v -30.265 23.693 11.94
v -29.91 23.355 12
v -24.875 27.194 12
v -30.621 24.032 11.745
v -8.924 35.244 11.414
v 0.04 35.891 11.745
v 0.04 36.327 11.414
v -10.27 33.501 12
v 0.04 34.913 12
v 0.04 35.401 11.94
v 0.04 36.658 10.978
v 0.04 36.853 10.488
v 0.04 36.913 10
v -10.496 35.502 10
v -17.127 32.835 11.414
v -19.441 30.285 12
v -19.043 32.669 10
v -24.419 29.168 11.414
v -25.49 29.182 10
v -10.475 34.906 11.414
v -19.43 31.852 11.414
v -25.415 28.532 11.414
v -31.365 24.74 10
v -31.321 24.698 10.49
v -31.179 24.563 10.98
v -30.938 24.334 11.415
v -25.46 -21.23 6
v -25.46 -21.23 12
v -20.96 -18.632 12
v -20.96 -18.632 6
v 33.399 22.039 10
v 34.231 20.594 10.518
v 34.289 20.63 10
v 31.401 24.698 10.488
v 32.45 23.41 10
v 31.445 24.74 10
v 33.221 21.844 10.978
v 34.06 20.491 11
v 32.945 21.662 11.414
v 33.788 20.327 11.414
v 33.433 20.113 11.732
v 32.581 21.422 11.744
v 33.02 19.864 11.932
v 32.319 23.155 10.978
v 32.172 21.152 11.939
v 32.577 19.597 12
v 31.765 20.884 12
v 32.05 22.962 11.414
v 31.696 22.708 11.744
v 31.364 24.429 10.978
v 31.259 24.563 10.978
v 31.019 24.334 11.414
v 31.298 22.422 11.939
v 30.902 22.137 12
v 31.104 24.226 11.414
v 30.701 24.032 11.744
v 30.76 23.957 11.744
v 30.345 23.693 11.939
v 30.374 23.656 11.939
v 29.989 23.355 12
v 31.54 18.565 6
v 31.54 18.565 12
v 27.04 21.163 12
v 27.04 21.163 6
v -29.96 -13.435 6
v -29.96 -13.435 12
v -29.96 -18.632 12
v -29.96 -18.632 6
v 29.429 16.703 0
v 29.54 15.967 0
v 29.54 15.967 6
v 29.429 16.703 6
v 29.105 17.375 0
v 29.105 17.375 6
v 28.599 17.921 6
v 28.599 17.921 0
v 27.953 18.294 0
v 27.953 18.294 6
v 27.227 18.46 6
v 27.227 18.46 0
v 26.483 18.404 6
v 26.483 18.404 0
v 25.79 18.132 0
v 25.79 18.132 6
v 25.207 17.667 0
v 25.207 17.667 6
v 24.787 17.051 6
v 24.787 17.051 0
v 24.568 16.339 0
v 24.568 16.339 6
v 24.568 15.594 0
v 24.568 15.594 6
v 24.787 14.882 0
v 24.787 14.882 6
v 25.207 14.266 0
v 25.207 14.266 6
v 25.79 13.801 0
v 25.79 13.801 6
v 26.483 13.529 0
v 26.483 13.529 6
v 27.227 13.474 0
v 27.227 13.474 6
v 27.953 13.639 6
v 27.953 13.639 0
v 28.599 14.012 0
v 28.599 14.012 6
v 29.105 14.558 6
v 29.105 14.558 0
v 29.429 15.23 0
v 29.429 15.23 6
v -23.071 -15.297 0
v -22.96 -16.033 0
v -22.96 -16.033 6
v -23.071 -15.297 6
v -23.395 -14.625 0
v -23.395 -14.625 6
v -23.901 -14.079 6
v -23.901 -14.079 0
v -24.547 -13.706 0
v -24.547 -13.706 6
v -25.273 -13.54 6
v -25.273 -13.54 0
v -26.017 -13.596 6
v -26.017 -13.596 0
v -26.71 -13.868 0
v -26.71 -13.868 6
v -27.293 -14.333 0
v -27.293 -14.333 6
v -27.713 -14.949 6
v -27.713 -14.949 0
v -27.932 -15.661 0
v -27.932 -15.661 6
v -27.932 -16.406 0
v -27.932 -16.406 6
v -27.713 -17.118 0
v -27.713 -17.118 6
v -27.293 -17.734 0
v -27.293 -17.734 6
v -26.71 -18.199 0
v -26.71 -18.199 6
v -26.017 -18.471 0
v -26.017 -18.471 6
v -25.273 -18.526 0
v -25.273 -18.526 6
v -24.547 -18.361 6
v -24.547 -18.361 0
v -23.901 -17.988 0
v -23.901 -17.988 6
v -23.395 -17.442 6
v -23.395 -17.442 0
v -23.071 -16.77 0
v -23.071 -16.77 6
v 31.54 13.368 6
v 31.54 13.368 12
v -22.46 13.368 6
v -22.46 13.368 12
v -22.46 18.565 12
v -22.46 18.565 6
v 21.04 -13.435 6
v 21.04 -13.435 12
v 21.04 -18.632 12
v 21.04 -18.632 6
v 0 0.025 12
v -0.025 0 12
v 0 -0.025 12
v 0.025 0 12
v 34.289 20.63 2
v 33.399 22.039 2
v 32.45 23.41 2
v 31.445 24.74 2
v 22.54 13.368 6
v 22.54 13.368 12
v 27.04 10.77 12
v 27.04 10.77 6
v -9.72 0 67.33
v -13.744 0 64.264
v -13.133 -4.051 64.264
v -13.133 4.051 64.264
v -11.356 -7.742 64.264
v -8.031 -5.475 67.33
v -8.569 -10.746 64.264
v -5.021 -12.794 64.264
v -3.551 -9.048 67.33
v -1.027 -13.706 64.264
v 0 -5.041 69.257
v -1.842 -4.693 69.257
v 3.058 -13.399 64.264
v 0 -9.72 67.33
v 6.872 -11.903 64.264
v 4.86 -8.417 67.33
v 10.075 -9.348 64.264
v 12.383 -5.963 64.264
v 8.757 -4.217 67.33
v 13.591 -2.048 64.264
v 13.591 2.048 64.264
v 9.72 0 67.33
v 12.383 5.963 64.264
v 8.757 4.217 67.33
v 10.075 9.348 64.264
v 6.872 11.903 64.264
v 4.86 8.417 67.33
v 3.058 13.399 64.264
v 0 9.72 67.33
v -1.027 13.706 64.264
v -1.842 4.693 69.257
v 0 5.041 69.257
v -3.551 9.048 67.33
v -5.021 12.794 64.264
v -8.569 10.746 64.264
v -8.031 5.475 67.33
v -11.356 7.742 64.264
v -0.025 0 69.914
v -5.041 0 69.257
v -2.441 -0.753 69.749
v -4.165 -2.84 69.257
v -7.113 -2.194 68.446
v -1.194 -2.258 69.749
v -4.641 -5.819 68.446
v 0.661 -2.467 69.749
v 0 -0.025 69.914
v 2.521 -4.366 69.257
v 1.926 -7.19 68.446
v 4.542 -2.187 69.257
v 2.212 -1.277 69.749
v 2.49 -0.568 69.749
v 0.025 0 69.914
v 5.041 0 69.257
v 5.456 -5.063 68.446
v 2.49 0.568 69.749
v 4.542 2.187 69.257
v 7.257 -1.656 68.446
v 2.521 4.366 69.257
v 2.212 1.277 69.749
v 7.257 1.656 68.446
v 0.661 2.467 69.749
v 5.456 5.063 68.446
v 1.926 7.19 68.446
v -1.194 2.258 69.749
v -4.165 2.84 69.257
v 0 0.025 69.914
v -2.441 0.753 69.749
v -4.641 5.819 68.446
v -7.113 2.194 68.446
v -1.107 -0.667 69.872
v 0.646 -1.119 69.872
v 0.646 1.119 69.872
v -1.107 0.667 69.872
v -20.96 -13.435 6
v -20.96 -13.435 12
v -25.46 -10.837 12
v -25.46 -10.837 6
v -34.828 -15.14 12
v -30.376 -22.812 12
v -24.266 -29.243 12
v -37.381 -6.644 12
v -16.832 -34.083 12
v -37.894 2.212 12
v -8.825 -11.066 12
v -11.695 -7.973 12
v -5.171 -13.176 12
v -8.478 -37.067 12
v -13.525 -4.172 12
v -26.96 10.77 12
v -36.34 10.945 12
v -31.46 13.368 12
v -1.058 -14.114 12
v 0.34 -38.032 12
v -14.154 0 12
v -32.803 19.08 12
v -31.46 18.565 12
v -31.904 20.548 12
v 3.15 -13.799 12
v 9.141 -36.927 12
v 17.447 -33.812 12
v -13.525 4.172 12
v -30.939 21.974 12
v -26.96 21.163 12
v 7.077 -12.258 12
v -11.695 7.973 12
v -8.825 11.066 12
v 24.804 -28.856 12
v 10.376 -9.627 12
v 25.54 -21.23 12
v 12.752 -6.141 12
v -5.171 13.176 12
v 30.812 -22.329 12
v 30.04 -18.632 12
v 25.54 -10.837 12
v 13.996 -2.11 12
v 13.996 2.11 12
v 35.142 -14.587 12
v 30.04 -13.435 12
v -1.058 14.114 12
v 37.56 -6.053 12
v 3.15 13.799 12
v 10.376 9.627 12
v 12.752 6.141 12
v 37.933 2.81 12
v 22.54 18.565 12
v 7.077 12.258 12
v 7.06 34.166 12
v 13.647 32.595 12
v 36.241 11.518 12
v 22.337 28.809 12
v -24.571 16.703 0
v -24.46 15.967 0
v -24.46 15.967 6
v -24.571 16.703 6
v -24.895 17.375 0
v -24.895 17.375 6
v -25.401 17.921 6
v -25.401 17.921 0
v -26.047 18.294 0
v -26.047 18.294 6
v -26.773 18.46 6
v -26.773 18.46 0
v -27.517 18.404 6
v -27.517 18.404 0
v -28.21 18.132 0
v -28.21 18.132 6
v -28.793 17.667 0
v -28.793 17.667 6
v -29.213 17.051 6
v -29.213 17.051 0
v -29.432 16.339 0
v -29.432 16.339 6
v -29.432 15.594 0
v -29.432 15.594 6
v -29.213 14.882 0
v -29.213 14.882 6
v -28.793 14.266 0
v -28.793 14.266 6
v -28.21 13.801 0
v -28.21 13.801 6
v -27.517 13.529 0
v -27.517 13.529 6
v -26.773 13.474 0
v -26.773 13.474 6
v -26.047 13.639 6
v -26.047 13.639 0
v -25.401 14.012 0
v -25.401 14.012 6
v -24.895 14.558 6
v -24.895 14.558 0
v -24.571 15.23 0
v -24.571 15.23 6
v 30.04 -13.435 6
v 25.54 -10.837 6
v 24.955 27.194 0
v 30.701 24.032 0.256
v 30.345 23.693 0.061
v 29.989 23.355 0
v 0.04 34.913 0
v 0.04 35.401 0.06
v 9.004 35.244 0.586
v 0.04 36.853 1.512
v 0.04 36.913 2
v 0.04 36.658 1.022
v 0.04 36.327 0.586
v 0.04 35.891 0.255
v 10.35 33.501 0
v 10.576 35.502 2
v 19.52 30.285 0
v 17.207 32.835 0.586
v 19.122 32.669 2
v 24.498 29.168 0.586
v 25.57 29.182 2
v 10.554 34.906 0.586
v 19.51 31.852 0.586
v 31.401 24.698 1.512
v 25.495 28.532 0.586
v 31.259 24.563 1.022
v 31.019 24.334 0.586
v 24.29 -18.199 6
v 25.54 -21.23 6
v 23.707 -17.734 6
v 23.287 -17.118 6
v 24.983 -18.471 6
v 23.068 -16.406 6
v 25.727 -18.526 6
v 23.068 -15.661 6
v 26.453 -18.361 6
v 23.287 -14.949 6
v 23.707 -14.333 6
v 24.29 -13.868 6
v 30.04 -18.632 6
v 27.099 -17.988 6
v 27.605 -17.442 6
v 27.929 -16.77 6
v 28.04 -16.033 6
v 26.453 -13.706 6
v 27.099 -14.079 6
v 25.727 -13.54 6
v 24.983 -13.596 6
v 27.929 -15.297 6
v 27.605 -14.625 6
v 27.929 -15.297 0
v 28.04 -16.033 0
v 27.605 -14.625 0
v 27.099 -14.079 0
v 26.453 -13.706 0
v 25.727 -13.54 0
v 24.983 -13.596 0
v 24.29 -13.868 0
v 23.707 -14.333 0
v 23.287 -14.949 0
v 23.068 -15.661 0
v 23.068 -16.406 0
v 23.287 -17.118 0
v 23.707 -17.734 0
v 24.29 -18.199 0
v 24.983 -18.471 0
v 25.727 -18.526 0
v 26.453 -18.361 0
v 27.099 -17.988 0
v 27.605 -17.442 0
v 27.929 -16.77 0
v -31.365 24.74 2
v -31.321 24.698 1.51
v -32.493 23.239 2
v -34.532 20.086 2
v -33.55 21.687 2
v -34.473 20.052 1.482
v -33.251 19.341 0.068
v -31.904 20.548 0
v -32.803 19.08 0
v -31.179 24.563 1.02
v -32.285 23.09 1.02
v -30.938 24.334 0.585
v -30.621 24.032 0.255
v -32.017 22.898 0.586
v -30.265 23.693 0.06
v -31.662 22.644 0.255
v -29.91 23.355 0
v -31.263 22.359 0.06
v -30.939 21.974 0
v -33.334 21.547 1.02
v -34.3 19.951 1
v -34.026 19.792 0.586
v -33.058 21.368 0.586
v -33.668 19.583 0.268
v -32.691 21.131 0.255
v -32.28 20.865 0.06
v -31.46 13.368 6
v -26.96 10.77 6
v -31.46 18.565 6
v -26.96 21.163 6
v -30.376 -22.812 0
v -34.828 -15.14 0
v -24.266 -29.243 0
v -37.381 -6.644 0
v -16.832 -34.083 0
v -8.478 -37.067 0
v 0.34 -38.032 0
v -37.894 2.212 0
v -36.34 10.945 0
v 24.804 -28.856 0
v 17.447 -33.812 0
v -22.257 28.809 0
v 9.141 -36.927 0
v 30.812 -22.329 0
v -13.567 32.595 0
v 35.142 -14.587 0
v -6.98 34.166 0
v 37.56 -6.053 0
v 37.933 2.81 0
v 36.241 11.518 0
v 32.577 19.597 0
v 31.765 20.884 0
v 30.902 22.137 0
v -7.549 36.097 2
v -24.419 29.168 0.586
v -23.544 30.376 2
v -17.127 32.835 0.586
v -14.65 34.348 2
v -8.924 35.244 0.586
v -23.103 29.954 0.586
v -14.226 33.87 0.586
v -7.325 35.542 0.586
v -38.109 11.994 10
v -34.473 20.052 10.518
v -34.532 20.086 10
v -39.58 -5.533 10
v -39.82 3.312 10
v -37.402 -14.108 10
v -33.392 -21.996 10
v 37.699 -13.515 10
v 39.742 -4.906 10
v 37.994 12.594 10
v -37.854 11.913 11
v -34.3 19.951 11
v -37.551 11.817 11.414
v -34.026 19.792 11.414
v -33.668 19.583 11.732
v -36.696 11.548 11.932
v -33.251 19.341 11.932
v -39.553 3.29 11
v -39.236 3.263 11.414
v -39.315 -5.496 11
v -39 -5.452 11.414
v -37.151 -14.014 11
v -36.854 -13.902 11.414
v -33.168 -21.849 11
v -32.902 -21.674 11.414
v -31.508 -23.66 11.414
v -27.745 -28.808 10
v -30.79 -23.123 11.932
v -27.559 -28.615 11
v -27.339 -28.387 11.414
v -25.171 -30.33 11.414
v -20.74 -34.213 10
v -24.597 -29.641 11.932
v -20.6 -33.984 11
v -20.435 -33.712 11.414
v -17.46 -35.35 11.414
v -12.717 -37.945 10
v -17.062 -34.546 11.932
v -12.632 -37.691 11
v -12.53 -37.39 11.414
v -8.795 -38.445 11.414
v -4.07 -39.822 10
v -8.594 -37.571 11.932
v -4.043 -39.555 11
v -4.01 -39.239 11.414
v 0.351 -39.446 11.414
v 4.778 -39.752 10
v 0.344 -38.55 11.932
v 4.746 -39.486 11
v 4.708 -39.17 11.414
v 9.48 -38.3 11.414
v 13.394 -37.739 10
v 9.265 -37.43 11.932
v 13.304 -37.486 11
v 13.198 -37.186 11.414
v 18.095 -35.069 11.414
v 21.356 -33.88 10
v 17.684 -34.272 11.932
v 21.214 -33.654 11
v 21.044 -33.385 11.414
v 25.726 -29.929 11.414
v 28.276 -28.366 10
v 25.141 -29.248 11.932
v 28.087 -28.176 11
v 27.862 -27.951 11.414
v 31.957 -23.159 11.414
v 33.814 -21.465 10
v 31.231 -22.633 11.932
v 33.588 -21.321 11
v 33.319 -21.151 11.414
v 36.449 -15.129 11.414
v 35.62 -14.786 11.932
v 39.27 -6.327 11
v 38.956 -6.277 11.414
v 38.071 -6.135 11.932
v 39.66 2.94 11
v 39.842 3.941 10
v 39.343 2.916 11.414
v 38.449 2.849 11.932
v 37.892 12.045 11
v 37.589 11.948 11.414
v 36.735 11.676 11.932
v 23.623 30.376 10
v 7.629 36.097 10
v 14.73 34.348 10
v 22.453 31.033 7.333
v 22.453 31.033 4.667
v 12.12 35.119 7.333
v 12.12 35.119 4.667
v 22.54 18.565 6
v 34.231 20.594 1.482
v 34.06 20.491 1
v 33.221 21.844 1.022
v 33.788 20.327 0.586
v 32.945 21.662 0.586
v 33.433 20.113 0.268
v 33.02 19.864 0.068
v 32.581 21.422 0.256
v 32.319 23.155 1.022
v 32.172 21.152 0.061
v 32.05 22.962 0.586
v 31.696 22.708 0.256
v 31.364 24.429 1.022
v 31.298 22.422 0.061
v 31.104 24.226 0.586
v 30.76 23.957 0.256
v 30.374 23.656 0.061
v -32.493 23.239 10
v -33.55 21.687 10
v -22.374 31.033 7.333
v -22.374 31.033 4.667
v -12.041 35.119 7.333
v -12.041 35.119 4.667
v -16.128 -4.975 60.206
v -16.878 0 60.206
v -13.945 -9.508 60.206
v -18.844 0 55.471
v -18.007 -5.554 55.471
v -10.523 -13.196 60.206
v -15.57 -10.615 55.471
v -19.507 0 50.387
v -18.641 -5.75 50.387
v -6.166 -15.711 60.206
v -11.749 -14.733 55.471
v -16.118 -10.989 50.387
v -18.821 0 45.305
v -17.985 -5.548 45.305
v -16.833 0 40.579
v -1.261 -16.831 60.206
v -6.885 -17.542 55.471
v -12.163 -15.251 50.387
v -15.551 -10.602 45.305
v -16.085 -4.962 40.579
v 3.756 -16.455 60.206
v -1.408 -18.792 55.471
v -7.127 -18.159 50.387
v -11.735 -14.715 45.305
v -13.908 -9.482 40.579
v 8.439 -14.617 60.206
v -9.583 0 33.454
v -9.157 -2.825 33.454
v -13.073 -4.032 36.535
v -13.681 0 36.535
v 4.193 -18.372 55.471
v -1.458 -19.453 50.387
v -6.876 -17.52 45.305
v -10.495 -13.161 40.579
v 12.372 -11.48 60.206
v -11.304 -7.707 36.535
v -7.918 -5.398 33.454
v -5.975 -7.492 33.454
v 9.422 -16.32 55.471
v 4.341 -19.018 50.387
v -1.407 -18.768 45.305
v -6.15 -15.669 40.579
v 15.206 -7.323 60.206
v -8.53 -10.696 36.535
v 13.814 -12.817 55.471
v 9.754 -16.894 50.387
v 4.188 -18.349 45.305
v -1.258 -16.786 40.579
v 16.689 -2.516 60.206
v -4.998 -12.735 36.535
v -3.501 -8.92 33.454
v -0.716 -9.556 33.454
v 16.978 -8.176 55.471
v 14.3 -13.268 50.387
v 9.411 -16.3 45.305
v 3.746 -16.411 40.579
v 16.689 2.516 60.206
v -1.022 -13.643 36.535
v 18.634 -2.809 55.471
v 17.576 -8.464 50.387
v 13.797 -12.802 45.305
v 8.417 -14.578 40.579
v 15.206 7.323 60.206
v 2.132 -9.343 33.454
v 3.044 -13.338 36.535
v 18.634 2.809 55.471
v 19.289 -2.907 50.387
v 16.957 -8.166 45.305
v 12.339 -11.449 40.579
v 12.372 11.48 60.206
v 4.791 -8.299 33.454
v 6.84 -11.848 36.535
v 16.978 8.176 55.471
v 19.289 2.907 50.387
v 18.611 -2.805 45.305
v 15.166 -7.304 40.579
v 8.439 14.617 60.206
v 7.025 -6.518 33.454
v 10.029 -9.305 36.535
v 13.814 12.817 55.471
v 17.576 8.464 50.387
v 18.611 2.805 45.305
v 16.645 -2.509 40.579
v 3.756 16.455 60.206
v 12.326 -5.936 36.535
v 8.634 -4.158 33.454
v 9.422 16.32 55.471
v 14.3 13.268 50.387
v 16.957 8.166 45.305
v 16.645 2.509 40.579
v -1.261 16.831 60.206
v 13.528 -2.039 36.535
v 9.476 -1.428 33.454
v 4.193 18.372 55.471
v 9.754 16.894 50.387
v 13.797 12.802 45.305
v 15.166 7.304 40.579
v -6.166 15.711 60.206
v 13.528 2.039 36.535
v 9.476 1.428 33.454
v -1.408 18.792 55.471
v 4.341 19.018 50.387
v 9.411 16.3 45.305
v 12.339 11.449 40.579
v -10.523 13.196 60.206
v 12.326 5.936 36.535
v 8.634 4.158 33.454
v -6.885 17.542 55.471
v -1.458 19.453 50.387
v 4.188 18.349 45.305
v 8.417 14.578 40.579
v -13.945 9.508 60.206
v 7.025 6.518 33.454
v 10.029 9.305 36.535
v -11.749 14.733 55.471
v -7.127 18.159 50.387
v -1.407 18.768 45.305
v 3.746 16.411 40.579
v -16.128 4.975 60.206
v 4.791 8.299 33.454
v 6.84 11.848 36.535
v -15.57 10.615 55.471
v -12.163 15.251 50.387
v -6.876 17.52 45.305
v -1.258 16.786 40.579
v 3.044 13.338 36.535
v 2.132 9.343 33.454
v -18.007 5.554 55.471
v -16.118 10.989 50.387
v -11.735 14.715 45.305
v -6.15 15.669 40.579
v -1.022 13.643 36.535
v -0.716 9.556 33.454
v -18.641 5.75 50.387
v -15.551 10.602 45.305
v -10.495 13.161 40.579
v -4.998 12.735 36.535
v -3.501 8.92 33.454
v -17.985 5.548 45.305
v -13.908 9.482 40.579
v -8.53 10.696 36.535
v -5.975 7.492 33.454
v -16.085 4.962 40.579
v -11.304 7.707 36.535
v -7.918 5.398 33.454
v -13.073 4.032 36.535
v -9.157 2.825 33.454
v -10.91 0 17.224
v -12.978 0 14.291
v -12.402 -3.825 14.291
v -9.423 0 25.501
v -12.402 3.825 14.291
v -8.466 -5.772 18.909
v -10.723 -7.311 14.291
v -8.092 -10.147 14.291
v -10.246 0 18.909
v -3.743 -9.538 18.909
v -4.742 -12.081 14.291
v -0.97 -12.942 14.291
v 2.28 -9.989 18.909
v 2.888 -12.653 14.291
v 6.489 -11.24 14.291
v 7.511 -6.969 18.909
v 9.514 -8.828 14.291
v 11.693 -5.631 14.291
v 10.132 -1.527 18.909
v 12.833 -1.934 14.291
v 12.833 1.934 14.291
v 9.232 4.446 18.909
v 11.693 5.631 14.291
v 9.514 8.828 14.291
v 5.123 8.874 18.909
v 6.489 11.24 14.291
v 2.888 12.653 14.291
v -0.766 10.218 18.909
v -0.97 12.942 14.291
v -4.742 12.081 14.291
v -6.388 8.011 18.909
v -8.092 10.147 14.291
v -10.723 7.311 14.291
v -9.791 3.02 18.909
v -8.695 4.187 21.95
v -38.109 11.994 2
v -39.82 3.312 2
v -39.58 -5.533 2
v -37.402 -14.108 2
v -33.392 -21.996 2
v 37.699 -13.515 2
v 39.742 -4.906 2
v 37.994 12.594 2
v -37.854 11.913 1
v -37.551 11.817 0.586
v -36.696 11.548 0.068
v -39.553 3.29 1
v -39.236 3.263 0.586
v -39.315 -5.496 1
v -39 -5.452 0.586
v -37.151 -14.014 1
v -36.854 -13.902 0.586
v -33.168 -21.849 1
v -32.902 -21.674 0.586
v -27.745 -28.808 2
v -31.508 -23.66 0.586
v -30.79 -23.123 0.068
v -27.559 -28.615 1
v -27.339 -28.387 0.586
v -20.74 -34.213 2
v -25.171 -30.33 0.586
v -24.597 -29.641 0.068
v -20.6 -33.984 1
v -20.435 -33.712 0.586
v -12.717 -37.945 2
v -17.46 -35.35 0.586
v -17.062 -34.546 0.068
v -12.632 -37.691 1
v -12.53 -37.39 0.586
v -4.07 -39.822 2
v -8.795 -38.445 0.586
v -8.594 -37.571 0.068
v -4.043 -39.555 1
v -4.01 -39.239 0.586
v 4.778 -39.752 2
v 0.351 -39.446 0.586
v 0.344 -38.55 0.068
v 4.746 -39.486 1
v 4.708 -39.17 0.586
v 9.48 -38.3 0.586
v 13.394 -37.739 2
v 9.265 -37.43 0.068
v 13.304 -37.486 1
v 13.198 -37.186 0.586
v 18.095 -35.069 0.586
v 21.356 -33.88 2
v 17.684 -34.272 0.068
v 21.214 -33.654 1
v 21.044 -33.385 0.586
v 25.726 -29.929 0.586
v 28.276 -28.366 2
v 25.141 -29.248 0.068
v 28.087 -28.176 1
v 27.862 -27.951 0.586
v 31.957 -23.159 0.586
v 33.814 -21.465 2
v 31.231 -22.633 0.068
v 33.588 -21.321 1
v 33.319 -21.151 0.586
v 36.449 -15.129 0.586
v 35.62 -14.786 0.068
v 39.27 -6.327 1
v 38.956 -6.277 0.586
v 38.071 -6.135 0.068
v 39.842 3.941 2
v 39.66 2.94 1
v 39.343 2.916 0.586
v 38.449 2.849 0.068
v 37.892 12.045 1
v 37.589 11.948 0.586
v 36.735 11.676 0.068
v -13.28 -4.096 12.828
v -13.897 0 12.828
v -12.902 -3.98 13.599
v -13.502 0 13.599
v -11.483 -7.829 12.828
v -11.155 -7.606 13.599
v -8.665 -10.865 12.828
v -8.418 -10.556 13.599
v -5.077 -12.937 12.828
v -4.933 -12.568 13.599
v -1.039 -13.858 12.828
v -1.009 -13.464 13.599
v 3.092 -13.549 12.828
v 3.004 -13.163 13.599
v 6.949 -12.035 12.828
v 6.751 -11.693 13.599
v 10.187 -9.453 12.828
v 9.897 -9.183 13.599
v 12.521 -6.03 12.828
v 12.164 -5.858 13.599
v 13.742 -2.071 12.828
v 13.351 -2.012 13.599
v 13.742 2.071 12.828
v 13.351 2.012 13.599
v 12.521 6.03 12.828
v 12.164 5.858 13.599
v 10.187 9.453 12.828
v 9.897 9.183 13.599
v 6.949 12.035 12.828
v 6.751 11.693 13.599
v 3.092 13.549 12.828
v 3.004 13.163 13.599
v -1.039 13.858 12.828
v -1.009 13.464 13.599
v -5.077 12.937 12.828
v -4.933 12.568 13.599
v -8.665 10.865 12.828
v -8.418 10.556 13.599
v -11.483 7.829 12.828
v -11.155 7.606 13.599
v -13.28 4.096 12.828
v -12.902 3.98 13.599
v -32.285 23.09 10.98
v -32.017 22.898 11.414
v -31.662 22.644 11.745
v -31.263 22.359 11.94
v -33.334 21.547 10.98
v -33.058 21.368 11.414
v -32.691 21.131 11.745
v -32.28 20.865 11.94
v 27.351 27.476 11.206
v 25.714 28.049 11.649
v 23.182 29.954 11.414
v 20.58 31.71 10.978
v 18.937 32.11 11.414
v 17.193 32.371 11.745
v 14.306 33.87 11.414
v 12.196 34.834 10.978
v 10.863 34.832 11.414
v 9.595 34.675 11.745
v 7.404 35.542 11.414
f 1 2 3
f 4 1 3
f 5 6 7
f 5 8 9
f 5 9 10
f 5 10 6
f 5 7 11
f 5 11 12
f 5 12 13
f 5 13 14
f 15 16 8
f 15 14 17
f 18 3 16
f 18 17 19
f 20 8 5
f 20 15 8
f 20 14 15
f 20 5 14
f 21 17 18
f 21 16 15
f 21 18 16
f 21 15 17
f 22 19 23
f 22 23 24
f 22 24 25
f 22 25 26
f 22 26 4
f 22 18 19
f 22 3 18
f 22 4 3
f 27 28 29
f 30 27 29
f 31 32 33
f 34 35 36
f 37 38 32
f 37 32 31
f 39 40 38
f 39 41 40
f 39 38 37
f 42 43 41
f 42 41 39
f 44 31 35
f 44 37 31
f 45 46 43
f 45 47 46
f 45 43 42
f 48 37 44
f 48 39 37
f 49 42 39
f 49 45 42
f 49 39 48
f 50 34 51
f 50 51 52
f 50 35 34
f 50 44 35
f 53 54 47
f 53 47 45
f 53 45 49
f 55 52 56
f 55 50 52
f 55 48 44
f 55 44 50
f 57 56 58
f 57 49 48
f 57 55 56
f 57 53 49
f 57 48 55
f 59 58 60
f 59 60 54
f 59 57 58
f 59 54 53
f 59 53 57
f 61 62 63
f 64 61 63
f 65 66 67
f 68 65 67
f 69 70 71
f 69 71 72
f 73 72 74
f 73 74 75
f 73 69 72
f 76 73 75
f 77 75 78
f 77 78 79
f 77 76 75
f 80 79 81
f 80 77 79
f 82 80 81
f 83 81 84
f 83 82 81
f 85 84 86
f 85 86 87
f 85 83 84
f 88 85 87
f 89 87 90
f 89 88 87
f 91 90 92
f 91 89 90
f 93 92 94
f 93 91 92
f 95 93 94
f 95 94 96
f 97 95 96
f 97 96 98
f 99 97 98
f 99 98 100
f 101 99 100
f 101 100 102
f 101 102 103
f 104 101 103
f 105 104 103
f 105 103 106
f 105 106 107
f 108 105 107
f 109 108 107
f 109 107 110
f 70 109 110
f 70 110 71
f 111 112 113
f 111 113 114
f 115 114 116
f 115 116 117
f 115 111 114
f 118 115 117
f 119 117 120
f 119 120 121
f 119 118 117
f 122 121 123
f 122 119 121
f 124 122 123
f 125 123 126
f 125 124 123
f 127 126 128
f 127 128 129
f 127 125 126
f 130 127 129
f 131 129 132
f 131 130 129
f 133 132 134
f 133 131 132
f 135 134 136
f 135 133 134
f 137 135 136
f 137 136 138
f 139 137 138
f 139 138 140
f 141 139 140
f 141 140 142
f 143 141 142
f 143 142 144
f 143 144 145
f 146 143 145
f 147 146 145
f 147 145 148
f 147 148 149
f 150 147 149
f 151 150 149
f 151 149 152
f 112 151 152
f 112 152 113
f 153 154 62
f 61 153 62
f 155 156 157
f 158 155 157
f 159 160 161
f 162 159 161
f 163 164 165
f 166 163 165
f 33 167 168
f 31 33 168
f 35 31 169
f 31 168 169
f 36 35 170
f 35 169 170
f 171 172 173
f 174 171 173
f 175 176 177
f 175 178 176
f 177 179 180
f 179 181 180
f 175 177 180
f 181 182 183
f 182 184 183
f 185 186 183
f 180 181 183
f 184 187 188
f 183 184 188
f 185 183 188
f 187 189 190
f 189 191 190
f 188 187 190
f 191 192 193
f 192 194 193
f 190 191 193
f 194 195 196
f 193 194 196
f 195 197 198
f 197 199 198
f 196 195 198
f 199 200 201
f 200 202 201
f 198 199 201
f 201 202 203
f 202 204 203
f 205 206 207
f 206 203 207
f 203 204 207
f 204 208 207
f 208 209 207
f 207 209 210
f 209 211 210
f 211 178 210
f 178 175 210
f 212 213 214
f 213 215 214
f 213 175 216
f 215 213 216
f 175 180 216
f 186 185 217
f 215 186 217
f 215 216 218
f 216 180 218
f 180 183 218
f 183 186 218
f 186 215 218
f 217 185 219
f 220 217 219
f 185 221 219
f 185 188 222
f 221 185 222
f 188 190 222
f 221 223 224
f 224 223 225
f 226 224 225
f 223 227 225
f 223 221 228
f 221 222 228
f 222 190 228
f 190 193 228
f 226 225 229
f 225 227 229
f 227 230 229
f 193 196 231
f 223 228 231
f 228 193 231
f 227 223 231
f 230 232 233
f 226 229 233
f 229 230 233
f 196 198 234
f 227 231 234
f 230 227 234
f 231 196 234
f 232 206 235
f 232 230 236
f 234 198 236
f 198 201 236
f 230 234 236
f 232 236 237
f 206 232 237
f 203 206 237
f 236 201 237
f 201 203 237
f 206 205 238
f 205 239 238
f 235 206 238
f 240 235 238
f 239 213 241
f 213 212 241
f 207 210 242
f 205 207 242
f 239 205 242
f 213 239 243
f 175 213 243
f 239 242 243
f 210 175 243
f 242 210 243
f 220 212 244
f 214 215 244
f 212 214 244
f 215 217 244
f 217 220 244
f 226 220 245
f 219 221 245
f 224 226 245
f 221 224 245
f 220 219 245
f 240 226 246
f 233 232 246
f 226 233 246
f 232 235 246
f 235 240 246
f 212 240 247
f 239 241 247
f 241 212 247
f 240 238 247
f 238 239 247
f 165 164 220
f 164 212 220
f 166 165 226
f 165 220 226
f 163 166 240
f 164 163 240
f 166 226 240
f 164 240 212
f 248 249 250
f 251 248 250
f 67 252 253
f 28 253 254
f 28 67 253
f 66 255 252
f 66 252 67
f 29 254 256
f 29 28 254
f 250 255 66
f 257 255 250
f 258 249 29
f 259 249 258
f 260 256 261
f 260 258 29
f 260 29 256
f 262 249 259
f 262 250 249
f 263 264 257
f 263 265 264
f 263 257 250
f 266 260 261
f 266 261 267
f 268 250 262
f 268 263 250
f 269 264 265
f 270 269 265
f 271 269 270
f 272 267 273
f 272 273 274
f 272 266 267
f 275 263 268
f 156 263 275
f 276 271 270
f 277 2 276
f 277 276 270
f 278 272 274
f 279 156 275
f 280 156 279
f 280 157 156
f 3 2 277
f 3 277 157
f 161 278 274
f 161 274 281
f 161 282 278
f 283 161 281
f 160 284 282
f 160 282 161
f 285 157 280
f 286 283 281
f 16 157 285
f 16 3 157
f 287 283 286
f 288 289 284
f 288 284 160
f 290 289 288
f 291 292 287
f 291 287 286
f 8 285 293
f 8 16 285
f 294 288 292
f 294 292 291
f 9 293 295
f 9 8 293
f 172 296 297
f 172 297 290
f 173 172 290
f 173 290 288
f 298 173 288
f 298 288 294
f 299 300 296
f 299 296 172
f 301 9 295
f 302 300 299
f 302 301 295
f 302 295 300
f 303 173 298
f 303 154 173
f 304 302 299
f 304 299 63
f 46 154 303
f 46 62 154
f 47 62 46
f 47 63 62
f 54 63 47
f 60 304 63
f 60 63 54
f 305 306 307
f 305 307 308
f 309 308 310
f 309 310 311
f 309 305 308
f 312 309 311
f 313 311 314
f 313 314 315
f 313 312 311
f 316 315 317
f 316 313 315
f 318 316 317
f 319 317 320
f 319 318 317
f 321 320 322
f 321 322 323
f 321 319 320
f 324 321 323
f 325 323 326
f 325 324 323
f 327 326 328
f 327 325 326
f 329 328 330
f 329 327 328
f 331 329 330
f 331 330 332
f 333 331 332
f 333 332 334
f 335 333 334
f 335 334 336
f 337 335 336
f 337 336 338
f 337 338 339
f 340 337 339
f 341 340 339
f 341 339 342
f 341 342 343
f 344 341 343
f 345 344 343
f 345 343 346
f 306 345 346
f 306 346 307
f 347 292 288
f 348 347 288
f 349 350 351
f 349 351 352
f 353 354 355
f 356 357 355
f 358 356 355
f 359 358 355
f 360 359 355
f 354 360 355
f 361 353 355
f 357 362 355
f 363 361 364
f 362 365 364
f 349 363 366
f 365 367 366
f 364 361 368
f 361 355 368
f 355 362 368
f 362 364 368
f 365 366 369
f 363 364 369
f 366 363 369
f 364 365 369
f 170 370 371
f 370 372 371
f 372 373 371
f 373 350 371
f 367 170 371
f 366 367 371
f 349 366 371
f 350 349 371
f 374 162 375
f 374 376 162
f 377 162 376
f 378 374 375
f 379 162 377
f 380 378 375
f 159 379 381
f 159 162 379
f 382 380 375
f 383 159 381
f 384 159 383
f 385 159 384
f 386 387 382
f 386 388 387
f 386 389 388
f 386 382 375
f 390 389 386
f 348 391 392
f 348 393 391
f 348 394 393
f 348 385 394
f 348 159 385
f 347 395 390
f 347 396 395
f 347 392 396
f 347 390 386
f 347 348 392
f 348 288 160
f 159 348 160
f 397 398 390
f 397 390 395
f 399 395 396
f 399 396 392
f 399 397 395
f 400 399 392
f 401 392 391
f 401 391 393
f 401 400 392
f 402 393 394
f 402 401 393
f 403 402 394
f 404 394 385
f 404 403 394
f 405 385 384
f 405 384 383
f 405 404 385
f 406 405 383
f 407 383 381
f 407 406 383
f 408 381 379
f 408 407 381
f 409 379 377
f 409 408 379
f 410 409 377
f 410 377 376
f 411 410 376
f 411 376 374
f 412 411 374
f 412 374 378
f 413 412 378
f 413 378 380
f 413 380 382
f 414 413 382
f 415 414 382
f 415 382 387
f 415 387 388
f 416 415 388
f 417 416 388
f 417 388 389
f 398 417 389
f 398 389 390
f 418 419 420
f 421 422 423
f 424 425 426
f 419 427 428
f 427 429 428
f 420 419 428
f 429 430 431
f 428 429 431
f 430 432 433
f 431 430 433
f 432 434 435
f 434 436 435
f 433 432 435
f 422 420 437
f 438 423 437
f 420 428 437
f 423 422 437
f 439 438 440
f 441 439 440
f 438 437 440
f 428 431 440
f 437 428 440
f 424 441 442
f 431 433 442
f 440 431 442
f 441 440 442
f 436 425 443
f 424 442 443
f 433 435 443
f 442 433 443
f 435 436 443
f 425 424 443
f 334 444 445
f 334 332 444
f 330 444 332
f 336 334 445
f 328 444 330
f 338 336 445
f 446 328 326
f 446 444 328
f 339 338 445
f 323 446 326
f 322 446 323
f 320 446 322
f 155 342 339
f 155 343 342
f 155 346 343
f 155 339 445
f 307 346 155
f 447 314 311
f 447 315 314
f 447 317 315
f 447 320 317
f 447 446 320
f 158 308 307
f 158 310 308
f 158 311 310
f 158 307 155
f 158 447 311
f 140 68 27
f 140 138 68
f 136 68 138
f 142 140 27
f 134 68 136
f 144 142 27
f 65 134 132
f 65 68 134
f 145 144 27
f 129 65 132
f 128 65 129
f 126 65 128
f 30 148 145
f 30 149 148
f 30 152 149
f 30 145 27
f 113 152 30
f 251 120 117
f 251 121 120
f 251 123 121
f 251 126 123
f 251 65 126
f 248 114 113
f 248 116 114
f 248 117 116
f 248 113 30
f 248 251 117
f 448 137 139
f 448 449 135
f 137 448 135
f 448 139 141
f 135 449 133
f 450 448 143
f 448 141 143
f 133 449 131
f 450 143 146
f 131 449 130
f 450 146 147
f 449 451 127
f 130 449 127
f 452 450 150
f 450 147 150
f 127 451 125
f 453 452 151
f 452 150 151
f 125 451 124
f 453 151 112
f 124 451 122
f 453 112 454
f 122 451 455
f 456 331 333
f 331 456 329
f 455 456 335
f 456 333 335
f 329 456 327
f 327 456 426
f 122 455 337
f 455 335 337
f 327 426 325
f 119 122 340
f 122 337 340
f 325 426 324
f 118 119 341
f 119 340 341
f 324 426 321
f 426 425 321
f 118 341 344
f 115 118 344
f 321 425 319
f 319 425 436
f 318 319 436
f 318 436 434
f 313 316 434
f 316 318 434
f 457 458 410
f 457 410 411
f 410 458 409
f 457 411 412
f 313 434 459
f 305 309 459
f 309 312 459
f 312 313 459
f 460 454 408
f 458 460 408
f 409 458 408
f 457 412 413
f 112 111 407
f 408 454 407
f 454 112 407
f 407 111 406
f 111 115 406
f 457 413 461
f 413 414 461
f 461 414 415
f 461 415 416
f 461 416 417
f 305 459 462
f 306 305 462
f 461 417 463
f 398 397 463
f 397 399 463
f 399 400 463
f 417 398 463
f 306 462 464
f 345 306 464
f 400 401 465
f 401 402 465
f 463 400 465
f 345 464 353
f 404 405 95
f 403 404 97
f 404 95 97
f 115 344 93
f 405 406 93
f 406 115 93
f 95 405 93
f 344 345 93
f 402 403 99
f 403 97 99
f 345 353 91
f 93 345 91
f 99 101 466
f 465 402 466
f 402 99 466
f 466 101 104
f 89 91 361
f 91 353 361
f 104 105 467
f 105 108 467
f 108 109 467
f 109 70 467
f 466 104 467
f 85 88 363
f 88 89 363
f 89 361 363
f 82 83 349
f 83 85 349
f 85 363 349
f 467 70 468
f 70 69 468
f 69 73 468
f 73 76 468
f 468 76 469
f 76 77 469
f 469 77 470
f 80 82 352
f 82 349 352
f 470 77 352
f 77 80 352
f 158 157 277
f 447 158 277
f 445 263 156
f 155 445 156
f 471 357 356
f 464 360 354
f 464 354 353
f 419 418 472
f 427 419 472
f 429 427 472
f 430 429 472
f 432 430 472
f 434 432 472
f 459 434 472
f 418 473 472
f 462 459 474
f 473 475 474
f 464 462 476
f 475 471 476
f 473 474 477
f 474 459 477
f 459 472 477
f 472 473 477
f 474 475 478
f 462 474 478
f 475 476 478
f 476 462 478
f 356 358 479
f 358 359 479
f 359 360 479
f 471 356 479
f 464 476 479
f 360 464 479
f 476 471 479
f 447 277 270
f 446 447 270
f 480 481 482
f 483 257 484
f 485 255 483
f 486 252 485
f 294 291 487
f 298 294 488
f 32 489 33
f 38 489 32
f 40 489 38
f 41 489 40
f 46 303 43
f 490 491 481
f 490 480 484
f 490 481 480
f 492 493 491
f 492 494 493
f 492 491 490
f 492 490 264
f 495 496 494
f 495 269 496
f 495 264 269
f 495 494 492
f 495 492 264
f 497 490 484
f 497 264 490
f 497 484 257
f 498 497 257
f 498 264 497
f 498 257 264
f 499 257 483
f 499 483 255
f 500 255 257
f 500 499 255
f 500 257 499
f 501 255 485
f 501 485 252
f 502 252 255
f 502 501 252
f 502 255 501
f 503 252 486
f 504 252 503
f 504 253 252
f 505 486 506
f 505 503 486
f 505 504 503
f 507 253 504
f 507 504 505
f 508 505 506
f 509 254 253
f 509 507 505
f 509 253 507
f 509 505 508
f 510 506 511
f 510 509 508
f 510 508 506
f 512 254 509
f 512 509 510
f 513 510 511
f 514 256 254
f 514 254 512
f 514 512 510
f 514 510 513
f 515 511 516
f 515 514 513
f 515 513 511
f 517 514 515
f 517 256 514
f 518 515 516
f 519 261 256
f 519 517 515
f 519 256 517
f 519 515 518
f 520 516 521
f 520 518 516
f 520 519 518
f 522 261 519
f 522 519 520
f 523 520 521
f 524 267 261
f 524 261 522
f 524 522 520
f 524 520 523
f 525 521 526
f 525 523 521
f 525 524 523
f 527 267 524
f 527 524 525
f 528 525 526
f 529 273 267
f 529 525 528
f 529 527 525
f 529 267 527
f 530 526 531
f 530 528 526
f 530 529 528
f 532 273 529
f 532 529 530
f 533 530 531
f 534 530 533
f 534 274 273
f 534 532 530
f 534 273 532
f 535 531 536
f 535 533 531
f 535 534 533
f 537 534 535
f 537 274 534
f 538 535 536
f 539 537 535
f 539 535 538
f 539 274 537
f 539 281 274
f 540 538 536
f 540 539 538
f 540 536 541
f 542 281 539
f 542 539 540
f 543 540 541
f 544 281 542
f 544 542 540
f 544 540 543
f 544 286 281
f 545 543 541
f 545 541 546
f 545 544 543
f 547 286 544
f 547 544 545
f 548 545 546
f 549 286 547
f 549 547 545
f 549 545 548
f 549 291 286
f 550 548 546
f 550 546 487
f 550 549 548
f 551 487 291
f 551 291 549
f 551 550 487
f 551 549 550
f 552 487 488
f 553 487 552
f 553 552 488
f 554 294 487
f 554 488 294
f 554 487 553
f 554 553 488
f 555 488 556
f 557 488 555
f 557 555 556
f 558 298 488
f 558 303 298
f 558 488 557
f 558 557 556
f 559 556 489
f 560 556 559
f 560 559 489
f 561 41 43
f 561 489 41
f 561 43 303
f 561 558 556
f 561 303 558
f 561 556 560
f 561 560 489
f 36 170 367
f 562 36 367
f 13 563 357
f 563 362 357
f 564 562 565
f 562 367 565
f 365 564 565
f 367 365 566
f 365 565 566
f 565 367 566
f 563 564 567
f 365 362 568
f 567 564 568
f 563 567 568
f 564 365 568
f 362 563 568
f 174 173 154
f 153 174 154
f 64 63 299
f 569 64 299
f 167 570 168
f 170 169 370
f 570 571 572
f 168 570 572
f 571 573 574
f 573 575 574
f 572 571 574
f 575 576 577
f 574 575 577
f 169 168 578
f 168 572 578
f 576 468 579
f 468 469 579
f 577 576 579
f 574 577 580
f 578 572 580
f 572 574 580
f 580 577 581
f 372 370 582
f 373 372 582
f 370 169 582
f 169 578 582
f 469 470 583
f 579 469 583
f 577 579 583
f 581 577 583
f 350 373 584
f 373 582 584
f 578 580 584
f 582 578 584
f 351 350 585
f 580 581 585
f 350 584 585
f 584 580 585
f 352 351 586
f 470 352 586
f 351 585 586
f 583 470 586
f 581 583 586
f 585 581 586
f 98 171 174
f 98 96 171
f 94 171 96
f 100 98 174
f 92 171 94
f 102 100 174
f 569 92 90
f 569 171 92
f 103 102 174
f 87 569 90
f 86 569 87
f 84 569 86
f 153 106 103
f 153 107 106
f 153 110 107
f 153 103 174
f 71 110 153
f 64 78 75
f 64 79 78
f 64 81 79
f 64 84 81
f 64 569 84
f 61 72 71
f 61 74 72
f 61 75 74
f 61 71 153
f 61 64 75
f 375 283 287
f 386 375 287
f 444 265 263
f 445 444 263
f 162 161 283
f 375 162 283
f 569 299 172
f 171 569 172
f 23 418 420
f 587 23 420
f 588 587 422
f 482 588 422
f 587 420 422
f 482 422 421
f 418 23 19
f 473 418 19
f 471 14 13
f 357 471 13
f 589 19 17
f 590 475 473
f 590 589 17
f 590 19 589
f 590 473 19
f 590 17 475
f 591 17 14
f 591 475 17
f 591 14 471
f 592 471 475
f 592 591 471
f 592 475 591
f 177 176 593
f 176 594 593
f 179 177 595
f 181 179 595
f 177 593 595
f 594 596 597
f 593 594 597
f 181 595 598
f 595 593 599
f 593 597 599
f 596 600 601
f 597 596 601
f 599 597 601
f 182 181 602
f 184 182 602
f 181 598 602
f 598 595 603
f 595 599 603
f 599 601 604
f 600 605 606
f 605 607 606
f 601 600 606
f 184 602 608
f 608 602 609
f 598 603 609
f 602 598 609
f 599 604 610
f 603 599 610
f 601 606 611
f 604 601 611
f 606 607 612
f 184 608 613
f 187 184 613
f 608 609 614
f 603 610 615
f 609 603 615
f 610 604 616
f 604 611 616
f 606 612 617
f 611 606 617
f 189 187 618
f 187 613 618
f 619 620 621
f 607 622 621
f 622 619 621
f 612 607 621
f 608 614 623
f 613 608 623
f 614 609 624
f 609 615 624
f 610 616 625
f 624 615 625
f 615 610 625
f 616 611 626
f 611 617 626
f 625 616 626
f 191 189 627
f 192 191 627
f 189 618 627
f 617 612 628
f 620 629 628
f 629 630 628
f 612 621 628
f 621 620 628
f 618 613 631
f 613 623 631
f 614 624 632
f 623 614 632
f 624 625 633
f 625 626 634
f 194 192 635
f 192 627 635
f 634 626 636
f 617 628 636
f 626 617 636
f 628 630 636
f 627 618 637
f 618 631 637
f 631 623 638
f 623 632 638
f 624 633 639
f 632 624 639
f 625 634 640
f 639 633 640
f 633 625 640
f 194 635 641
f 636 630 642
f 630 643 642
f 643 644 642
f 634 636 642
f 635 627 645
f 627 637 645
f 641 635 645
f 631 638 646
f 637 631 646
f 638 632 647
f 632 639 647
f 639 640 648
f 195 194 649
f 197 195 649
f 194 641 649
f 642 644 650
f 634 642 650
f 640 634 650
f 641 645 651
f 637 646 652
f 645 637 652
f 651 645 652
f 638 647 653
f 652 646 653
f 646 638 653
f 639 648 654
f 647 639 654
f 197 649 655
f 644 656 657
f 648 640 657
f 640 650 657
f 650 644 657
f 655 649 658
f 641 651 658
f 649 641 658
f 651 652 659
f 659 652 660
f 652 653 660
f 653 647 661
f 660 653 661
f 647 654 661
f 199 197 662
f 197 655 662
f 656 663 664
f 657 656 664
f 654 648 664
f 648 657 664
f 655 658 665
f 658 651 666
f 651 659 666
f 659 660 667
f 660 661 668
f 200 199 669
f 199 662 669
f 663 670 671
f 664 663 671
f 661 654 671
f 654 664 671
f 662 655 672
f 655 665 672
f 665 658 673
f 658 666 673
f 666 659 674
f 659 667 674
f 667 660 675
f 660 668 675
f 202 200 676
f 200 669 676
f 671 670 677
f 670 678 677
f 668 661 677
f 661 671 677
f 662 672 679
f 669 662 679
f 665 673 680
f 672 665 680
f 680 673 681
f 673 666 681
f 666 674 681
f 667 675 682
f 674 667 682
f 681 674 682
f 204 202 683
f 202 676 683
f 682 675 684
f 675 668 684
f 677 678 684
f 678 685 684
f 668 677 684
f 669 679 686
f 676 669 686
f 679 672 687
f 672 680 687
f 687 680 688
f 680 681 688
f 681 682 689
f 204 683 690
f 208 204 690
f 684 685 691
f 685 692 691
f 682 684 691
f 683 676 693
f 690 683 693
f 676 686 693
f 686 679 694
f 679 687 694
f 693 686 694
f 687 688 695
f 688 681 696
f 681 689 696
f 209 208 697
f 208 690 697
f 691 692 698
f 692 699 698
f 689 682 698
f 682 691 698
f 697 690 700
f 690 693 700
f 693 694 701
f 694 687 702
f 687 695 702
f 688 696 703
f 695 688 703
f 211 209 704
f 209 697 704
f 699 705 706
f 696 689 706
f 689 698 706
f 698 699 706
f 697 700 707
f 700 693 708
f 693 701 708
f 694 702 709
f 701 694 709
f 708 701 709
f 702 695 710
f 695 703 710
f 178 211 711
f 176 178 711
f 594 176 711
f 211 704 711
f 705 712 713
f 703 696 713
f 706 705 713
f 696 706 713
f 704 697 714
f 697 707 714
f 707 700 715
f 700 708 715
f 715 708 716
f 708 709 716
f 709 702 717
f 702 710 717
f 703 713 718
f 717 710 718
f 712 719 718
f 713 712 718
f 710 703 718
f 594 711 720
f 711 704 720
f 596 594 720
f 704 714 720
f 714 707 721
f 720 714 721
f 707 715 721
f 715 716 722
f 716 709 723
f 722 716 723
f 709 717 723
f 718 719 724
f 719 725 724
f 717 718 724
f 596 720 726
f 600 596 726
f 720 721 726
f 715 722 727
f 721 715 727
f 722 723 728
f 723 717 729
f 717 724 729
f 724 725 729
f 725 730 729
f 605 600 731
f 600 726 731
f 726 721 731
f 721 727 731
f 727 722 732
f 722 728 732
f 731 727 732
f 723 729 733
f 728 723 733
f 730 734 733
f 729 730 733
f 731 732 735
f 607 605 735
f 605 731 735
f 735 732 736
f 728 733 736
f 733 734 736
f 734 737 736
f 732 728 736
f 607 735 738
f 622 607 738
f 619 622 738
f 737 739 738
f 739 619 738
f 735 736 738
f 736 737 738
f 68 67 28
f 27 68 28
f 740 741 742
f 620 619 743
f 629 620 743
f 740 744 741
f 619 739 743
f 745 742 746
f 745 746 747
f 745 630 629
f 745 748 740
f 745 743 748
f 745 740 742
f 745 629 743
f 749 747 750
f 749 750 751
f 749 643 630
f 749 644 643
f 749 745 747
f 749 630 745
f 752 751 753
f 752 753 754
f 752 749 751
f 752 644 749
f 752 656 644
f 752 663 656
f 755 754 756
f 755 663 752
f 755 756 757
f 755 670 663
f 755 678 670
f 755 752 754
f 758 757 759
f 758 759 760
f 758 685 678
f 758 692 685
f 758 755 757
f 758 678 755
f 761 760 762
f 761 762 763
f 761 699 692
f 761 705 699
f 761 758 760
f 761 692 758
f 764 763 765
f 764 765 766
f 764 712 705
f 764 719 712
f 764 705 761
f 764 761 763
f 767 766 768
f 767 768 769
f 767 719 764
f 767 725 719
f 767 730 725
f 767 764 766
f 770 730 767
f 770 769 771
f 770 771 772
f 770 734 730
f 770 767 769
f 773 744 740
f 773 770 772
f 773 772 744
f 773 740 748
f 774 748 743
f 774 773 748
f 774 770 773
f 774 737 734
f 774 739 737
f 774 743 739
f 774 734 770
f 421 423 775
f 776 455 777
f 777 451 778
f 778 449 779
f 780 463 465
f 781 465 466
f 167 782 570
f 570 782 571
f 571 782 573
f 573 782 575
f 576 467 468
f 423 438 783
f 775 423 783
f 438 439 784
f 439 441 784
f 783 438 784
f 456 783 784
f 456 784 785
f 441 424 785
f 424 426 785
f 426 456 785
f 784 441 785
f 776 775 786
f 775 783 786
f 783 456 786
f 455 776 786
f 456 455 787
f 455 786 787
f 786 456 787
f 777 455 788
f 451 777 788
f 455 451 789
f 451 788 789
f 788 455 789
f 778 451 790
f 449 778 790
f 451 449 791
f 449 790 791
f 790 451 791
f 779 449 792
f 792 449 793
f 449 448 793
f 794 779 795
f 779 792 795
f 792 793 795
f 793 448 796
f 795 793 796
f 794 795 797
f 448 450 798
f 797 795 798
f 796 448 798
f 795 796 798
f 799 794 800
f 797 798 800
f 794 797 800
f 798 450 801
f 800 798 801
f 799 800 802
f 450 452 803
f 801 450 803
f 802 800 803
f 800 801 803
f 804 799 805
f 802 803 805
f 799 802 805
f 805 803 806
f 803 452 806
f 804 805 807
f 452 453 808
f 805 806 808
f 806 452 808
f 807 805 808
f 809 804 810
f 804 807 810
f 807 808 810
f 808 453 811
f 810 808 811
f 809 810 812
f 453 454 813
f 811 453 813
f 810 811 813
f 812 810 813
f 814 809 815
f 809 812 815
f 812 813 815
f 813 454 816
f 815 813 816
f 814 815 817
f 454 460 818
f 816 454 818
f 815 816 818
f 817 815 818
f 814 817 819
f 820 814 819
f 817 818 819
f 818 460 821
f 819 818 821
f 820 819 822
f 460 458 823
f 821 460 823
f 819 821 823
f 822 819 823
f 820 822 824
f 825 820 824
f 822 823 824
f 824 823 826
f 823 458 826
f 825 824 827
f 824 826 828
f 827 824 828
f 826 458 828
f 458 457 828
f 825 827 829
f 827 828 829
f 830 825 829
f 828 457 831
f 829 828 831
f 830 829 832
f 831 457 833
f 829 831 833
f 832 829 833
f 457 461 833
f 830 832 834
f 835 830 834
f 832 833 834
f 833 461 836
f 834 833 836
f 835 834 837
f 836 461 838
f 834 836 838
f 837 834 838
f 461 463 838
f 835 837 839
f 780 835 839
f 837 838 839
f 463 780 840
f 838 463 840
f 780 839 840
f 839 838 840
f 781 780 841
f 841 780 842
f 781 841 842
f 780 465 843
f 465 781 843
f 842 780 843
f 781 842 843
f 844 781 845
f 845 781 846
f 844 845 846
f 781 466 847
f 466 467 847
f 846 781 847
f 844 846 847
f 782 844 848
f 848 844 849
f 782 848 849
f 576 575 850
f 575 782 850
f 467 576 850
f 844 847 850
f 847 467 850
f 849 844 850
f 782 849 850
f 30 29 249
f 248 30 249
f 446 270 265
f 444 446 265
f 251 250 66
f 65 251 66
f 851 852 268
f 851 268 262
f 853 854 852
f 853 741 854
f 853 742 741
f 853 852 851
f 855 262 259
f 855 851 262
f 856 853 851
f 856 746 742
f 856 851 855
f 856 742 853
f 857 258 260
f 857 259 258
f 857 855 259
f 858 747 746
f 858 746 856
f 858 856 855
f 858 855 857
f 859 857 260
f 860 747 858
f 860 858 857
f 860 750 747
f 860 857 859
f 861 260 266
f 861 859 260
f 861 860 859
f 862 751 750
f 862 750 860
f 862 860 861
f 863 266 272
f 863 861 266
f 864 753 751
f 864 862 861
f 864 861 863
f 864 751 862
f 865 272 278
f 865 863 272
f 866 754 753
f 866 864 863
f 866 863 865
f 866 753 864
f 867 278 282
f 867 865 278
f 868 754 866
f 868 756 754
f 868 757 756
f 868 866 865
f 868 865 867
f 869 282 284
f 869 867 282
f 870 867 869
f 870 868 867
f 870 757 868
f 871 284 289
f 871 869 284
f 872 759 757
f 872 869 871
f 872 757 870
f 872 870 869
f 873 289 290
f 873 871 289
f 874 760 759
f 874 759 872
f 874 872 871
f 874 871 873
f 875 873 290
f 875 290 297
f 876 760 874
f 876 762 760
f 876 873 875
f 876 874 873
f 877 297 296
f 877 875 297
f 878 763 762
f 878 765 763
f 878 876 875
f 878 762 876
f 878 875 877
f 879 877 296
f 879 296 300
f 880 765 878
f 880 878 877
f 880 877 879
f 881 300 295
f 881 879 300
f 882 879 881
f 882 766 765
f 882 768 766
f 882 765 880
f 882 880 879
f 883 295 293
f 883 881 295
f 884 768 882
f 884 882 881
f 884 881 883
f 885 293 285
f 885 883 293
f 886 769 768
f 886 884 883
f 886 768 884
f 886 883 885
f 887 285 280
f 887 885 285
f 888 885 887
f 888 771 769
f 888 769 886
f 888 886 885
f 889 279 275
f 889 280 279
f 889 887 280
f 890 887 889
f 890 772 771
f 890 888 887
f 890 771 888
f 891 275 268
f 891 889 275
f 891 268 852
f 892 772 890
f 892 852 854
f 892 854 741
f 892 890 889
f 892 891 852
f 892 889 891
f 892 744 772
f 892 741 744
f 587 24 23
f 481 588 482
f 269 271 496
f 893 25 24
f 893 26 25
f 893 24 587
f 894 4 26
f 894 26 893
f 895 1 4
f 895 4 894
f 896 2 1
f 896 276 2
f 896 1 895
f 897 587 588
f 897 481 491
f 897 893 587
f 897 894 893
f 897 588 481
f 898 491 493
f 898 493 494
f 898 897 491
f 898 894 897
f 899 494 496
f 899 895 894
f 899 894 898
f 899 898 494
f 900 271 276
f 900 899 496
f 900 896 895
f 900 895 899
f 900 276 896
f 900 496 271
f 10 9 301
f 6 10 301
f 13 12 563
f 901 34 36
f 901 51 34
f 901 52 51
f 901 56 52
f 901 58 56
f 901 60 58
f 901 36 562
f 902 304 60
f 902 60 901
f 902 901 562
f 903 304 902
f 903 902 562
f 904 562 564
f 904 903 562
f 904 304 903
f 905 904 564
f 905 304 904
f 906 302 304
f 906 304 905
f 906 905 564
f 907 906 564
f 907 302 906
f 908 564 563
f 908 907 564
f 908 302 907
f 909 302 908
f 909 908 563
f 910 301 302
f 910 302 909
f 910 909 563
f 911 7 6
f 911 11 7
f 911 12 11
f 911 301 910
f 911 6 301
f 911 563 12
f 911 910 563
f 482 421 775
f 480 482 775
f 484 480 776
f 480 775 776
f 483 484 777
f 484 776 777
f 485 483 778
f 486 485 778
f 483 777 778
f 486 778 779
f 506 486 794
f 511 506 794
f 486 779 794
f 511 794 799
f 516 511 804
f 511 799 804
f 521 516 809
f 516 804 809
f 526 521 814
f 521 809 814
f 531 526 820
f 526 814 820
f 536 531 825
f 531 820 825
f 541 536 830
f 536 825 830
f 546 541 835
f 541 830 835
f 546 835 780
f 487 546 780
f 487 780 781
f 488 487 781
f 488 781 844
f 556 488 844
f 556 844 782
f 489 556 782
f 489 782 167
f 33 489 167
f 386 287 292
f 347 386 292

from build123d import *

# Parameters (mm, degrees)
F0_R     = 2.5
F1_DEPTH = 12
F3_R     = 2.5
F4_DEPTH = 6
F5_R     = 2


# Not quite as in the source:
# - a fillet or chamfer that OpenCascade refuses, or shapes differently, is made with other operations: its cross-section is extruded or revolved along the edge and cut away or added


with BuildPart() as f1:
    # F0 (on Top) → F1 (new body)
    with BuildSketch(Plane.XY):
        with BuildLine():
            ThreePointArc((-31.3651592039, 24.7400687451), (-33.0304528025, 22.4689333996), (-34.5318159842, 20.0862527403))
            ThreePointArc((-34.5318159842, 20.0862527403), (0.3556410553, -40.0322385106), (34.289361103, 20.6296959515))
            ThreePointArc((34.289361103, 20.6296959515), (32.9313235996, 22.7293613836), (31.4447447441, 24.7400687451))
            add(Edge.make_bspline(
                [(31.4447447441, 24.7400687451), (22.988602022, 32.1085255021), (13.1297165658, 36.2919575894), (0.0397927701, 36.9132596428)],
                knots=[0, 0, 0, 0, 0.5, 0.5, 0.5, 0.5], degree=3))
            add(Edge.make_bspline(
                [(-31.3651592039, 24.7400687451), (-22.9090164817, 32.1085255021), (-13.0501310255, 36.2919575894), (0.0397927701, 36.9132596428)],
                knots=[0, 0, 0, 0, 0.5, 0.5, 0.5, 0.5], degree=3))
        make_face()
        with Locations((-25.4602072299, -16.0334855318)):
            Circle(F0_R, mode=Mode.SUBTRACT)
        with Locations((25.5397927701, -16.0334855318)):
            Circle(F0_R, mode=Mode.SUBTRACT)
        with Locations((-26.9602072299, 15.9665144682)):
            Circle(F0_R, mode=Mode.SUBTRACT)
        with Locations((27.0397927701, 15.9665144682)):
            Circle(F0_R, mode=Mode.SUBTRACT)
    extrude(amount=F1_DEPTH)

    # F3 (on face) → F4 (cut)
    with BuildSketch(Plane.XY.offset(12)):
        Polygon((-22.4602072299, 13.3684382568), (-22.4602072299, 18.5645906795), (-26.9602072299, 21.1626668909), (-31.4602072299, 18.5645906795), (-31.4602072299, 13.3684382568), (-26.9602072299, 10.7703620455), align=None)
        with Locations((-26.9602072299, 15.9665144682)):
            Circle(F3_R, mode=Mode.SUBTRACT)
        Polygon((22.5397927701, 18.5645906795), (22.5397927701, 13.3684382568), (27.0397927701, 10.7703620455), (31.5397927701, 13.3684382568), (31.5397927701, 18.5645906795), (27.0397927701, 21.1626668909), align=None)
        with Locations((27.0397927701, 15.9665144682)):
            Circle(F3_R, mode=Mode.SUBTRACT)
        Polygon((21.0397927701, -13.4354093205), (21.0397927701, -18.6315617432), (25.5397927701, -21.2296379545), (30.0397927701, -18.6315617432), (30.0397927701, -13.4354093205), (25.5397927701, -10.8373331091), align=None)
        with Locations((25.5397927701, -16.0334855318)):
            Circle(F3_R, mode=Mode.SUBTRACT)
        Polygon((-20.9602072299, -18.6315617432), (-20.9602072299, -13.4354093205), (-25.4602072299, -10.8373331091), (-29.9602072299, -13.4354093205), (-29.9602072299, -18.6315617432), (-25.4602072299, -21.2296379545), align=None)
        with Locations((-25.4602072299, -16.0334855318)):
            Circle(F3_R, mode=Mode.SUBTRACT)
    extrude(amount=-F4_DEPTH, mode=Mode.SUBTRACT)

    # F5
    f5_edges = [f1.edges().sort_by_distance(p)[0] for p in [
        (-2.459557, -39.955325, 12),
        (-2.459557, -39.955325, 0),
        (16.831403, 33.608309, 12),
        (-16.751817, 33.608309, 12),
        (-16.751817, 33.608309, 0),
        (16.831403, 33.608309, 0),
    ]]
    fillet(f5_edges, radius=F5_R)

    # F6 (on Front) → F7 (revolve)
    with BuildSketch(Plane.XZ):
        with BuildLine():
            Line((-14.1540115437, 11.8460487906), (-0.0248217459, 11.8460487906))
            Line((-0.0248217459, 11.8460487906), (-0.0248217459, 12.5021283307))
            Line((-0.0248217459, 12.5021283307), (-0.0248217459, 25.1048319042))
            Line((-0.0248217459, 25.1048319042), (-0.0248217459, 58.8260033315))
            Line((-0.0248217459, 58.8260033315), (-0.0248217459, 64.264058532))
            Line((-0.0248217459, 64.264058532), (-0.0248217459, 69.9135838276))
            ThreePointArc((-0.0248217459, 69.9135838276), (-7.4432934465, 68.4459215755), (-13.744069299, 64.264058532))
            ThreePointArc((-13.744069299, 64.264058532), (-19.3321206406, 47.8233148814), (-9.582830593, 33.4540520906))
            add(Edge.make_bspline(
                [(-14.1540115437, 13.0516188551), (-12.6789047108, 14.5682779679), (-8.9868889419, 18.3642941178), (-9.359245349, 27.7926803584), (-9.582830593, 33.4540520906)],
                knots=[0, 0, 0, 0, 0.3995396892, 1, 1, 1, 1], degree=3))
            Line((-14.1540115437, 13.0516188551), (-14.1540115437, 11.8460487906))
        make_face()
    revolve(axis=Axis((0, 0, 50.5361706018), (0, 0, 1)))

    # F8: fillet of radius 5 on 1 edges, made by hand

    # F8_s1 → F8_t2 (revolve, cut)
    with BuildSketch(Plane.XZ):
        with BuildLine():
            ThreePointArc((-14.1540115437, 12), (-13.716188898, 13.2222804174), (-12.9784286022, 14.2906285974))
            Line((-12.9784286022, 14.2906285974), (-13.0526409195, 14.3576549502))
            ThreePointArc((-13.0526409195, 14.3576549502), (-13.6328295807, 13.7347113697), (-14.2256974002, 13.1213407167))
            Line((-14.2256974002, 13.1213407167), (-14.2540115437, 13.0516188551))
            ThreePointArc((-14.2540115437, 13.0516188551), (-14.2540115437, 12.5258094276), (-14.2517355198, 12.0212137808))
            Line((-14.2517355198, 12.0212137808), (-14.1540115437, 12))
        make_face()
    revolve(axis=Axis((0, 0, 13.0516188551), (0, 0, 1)), mode=Mode.SUBTRACT)


solid = f1.part
